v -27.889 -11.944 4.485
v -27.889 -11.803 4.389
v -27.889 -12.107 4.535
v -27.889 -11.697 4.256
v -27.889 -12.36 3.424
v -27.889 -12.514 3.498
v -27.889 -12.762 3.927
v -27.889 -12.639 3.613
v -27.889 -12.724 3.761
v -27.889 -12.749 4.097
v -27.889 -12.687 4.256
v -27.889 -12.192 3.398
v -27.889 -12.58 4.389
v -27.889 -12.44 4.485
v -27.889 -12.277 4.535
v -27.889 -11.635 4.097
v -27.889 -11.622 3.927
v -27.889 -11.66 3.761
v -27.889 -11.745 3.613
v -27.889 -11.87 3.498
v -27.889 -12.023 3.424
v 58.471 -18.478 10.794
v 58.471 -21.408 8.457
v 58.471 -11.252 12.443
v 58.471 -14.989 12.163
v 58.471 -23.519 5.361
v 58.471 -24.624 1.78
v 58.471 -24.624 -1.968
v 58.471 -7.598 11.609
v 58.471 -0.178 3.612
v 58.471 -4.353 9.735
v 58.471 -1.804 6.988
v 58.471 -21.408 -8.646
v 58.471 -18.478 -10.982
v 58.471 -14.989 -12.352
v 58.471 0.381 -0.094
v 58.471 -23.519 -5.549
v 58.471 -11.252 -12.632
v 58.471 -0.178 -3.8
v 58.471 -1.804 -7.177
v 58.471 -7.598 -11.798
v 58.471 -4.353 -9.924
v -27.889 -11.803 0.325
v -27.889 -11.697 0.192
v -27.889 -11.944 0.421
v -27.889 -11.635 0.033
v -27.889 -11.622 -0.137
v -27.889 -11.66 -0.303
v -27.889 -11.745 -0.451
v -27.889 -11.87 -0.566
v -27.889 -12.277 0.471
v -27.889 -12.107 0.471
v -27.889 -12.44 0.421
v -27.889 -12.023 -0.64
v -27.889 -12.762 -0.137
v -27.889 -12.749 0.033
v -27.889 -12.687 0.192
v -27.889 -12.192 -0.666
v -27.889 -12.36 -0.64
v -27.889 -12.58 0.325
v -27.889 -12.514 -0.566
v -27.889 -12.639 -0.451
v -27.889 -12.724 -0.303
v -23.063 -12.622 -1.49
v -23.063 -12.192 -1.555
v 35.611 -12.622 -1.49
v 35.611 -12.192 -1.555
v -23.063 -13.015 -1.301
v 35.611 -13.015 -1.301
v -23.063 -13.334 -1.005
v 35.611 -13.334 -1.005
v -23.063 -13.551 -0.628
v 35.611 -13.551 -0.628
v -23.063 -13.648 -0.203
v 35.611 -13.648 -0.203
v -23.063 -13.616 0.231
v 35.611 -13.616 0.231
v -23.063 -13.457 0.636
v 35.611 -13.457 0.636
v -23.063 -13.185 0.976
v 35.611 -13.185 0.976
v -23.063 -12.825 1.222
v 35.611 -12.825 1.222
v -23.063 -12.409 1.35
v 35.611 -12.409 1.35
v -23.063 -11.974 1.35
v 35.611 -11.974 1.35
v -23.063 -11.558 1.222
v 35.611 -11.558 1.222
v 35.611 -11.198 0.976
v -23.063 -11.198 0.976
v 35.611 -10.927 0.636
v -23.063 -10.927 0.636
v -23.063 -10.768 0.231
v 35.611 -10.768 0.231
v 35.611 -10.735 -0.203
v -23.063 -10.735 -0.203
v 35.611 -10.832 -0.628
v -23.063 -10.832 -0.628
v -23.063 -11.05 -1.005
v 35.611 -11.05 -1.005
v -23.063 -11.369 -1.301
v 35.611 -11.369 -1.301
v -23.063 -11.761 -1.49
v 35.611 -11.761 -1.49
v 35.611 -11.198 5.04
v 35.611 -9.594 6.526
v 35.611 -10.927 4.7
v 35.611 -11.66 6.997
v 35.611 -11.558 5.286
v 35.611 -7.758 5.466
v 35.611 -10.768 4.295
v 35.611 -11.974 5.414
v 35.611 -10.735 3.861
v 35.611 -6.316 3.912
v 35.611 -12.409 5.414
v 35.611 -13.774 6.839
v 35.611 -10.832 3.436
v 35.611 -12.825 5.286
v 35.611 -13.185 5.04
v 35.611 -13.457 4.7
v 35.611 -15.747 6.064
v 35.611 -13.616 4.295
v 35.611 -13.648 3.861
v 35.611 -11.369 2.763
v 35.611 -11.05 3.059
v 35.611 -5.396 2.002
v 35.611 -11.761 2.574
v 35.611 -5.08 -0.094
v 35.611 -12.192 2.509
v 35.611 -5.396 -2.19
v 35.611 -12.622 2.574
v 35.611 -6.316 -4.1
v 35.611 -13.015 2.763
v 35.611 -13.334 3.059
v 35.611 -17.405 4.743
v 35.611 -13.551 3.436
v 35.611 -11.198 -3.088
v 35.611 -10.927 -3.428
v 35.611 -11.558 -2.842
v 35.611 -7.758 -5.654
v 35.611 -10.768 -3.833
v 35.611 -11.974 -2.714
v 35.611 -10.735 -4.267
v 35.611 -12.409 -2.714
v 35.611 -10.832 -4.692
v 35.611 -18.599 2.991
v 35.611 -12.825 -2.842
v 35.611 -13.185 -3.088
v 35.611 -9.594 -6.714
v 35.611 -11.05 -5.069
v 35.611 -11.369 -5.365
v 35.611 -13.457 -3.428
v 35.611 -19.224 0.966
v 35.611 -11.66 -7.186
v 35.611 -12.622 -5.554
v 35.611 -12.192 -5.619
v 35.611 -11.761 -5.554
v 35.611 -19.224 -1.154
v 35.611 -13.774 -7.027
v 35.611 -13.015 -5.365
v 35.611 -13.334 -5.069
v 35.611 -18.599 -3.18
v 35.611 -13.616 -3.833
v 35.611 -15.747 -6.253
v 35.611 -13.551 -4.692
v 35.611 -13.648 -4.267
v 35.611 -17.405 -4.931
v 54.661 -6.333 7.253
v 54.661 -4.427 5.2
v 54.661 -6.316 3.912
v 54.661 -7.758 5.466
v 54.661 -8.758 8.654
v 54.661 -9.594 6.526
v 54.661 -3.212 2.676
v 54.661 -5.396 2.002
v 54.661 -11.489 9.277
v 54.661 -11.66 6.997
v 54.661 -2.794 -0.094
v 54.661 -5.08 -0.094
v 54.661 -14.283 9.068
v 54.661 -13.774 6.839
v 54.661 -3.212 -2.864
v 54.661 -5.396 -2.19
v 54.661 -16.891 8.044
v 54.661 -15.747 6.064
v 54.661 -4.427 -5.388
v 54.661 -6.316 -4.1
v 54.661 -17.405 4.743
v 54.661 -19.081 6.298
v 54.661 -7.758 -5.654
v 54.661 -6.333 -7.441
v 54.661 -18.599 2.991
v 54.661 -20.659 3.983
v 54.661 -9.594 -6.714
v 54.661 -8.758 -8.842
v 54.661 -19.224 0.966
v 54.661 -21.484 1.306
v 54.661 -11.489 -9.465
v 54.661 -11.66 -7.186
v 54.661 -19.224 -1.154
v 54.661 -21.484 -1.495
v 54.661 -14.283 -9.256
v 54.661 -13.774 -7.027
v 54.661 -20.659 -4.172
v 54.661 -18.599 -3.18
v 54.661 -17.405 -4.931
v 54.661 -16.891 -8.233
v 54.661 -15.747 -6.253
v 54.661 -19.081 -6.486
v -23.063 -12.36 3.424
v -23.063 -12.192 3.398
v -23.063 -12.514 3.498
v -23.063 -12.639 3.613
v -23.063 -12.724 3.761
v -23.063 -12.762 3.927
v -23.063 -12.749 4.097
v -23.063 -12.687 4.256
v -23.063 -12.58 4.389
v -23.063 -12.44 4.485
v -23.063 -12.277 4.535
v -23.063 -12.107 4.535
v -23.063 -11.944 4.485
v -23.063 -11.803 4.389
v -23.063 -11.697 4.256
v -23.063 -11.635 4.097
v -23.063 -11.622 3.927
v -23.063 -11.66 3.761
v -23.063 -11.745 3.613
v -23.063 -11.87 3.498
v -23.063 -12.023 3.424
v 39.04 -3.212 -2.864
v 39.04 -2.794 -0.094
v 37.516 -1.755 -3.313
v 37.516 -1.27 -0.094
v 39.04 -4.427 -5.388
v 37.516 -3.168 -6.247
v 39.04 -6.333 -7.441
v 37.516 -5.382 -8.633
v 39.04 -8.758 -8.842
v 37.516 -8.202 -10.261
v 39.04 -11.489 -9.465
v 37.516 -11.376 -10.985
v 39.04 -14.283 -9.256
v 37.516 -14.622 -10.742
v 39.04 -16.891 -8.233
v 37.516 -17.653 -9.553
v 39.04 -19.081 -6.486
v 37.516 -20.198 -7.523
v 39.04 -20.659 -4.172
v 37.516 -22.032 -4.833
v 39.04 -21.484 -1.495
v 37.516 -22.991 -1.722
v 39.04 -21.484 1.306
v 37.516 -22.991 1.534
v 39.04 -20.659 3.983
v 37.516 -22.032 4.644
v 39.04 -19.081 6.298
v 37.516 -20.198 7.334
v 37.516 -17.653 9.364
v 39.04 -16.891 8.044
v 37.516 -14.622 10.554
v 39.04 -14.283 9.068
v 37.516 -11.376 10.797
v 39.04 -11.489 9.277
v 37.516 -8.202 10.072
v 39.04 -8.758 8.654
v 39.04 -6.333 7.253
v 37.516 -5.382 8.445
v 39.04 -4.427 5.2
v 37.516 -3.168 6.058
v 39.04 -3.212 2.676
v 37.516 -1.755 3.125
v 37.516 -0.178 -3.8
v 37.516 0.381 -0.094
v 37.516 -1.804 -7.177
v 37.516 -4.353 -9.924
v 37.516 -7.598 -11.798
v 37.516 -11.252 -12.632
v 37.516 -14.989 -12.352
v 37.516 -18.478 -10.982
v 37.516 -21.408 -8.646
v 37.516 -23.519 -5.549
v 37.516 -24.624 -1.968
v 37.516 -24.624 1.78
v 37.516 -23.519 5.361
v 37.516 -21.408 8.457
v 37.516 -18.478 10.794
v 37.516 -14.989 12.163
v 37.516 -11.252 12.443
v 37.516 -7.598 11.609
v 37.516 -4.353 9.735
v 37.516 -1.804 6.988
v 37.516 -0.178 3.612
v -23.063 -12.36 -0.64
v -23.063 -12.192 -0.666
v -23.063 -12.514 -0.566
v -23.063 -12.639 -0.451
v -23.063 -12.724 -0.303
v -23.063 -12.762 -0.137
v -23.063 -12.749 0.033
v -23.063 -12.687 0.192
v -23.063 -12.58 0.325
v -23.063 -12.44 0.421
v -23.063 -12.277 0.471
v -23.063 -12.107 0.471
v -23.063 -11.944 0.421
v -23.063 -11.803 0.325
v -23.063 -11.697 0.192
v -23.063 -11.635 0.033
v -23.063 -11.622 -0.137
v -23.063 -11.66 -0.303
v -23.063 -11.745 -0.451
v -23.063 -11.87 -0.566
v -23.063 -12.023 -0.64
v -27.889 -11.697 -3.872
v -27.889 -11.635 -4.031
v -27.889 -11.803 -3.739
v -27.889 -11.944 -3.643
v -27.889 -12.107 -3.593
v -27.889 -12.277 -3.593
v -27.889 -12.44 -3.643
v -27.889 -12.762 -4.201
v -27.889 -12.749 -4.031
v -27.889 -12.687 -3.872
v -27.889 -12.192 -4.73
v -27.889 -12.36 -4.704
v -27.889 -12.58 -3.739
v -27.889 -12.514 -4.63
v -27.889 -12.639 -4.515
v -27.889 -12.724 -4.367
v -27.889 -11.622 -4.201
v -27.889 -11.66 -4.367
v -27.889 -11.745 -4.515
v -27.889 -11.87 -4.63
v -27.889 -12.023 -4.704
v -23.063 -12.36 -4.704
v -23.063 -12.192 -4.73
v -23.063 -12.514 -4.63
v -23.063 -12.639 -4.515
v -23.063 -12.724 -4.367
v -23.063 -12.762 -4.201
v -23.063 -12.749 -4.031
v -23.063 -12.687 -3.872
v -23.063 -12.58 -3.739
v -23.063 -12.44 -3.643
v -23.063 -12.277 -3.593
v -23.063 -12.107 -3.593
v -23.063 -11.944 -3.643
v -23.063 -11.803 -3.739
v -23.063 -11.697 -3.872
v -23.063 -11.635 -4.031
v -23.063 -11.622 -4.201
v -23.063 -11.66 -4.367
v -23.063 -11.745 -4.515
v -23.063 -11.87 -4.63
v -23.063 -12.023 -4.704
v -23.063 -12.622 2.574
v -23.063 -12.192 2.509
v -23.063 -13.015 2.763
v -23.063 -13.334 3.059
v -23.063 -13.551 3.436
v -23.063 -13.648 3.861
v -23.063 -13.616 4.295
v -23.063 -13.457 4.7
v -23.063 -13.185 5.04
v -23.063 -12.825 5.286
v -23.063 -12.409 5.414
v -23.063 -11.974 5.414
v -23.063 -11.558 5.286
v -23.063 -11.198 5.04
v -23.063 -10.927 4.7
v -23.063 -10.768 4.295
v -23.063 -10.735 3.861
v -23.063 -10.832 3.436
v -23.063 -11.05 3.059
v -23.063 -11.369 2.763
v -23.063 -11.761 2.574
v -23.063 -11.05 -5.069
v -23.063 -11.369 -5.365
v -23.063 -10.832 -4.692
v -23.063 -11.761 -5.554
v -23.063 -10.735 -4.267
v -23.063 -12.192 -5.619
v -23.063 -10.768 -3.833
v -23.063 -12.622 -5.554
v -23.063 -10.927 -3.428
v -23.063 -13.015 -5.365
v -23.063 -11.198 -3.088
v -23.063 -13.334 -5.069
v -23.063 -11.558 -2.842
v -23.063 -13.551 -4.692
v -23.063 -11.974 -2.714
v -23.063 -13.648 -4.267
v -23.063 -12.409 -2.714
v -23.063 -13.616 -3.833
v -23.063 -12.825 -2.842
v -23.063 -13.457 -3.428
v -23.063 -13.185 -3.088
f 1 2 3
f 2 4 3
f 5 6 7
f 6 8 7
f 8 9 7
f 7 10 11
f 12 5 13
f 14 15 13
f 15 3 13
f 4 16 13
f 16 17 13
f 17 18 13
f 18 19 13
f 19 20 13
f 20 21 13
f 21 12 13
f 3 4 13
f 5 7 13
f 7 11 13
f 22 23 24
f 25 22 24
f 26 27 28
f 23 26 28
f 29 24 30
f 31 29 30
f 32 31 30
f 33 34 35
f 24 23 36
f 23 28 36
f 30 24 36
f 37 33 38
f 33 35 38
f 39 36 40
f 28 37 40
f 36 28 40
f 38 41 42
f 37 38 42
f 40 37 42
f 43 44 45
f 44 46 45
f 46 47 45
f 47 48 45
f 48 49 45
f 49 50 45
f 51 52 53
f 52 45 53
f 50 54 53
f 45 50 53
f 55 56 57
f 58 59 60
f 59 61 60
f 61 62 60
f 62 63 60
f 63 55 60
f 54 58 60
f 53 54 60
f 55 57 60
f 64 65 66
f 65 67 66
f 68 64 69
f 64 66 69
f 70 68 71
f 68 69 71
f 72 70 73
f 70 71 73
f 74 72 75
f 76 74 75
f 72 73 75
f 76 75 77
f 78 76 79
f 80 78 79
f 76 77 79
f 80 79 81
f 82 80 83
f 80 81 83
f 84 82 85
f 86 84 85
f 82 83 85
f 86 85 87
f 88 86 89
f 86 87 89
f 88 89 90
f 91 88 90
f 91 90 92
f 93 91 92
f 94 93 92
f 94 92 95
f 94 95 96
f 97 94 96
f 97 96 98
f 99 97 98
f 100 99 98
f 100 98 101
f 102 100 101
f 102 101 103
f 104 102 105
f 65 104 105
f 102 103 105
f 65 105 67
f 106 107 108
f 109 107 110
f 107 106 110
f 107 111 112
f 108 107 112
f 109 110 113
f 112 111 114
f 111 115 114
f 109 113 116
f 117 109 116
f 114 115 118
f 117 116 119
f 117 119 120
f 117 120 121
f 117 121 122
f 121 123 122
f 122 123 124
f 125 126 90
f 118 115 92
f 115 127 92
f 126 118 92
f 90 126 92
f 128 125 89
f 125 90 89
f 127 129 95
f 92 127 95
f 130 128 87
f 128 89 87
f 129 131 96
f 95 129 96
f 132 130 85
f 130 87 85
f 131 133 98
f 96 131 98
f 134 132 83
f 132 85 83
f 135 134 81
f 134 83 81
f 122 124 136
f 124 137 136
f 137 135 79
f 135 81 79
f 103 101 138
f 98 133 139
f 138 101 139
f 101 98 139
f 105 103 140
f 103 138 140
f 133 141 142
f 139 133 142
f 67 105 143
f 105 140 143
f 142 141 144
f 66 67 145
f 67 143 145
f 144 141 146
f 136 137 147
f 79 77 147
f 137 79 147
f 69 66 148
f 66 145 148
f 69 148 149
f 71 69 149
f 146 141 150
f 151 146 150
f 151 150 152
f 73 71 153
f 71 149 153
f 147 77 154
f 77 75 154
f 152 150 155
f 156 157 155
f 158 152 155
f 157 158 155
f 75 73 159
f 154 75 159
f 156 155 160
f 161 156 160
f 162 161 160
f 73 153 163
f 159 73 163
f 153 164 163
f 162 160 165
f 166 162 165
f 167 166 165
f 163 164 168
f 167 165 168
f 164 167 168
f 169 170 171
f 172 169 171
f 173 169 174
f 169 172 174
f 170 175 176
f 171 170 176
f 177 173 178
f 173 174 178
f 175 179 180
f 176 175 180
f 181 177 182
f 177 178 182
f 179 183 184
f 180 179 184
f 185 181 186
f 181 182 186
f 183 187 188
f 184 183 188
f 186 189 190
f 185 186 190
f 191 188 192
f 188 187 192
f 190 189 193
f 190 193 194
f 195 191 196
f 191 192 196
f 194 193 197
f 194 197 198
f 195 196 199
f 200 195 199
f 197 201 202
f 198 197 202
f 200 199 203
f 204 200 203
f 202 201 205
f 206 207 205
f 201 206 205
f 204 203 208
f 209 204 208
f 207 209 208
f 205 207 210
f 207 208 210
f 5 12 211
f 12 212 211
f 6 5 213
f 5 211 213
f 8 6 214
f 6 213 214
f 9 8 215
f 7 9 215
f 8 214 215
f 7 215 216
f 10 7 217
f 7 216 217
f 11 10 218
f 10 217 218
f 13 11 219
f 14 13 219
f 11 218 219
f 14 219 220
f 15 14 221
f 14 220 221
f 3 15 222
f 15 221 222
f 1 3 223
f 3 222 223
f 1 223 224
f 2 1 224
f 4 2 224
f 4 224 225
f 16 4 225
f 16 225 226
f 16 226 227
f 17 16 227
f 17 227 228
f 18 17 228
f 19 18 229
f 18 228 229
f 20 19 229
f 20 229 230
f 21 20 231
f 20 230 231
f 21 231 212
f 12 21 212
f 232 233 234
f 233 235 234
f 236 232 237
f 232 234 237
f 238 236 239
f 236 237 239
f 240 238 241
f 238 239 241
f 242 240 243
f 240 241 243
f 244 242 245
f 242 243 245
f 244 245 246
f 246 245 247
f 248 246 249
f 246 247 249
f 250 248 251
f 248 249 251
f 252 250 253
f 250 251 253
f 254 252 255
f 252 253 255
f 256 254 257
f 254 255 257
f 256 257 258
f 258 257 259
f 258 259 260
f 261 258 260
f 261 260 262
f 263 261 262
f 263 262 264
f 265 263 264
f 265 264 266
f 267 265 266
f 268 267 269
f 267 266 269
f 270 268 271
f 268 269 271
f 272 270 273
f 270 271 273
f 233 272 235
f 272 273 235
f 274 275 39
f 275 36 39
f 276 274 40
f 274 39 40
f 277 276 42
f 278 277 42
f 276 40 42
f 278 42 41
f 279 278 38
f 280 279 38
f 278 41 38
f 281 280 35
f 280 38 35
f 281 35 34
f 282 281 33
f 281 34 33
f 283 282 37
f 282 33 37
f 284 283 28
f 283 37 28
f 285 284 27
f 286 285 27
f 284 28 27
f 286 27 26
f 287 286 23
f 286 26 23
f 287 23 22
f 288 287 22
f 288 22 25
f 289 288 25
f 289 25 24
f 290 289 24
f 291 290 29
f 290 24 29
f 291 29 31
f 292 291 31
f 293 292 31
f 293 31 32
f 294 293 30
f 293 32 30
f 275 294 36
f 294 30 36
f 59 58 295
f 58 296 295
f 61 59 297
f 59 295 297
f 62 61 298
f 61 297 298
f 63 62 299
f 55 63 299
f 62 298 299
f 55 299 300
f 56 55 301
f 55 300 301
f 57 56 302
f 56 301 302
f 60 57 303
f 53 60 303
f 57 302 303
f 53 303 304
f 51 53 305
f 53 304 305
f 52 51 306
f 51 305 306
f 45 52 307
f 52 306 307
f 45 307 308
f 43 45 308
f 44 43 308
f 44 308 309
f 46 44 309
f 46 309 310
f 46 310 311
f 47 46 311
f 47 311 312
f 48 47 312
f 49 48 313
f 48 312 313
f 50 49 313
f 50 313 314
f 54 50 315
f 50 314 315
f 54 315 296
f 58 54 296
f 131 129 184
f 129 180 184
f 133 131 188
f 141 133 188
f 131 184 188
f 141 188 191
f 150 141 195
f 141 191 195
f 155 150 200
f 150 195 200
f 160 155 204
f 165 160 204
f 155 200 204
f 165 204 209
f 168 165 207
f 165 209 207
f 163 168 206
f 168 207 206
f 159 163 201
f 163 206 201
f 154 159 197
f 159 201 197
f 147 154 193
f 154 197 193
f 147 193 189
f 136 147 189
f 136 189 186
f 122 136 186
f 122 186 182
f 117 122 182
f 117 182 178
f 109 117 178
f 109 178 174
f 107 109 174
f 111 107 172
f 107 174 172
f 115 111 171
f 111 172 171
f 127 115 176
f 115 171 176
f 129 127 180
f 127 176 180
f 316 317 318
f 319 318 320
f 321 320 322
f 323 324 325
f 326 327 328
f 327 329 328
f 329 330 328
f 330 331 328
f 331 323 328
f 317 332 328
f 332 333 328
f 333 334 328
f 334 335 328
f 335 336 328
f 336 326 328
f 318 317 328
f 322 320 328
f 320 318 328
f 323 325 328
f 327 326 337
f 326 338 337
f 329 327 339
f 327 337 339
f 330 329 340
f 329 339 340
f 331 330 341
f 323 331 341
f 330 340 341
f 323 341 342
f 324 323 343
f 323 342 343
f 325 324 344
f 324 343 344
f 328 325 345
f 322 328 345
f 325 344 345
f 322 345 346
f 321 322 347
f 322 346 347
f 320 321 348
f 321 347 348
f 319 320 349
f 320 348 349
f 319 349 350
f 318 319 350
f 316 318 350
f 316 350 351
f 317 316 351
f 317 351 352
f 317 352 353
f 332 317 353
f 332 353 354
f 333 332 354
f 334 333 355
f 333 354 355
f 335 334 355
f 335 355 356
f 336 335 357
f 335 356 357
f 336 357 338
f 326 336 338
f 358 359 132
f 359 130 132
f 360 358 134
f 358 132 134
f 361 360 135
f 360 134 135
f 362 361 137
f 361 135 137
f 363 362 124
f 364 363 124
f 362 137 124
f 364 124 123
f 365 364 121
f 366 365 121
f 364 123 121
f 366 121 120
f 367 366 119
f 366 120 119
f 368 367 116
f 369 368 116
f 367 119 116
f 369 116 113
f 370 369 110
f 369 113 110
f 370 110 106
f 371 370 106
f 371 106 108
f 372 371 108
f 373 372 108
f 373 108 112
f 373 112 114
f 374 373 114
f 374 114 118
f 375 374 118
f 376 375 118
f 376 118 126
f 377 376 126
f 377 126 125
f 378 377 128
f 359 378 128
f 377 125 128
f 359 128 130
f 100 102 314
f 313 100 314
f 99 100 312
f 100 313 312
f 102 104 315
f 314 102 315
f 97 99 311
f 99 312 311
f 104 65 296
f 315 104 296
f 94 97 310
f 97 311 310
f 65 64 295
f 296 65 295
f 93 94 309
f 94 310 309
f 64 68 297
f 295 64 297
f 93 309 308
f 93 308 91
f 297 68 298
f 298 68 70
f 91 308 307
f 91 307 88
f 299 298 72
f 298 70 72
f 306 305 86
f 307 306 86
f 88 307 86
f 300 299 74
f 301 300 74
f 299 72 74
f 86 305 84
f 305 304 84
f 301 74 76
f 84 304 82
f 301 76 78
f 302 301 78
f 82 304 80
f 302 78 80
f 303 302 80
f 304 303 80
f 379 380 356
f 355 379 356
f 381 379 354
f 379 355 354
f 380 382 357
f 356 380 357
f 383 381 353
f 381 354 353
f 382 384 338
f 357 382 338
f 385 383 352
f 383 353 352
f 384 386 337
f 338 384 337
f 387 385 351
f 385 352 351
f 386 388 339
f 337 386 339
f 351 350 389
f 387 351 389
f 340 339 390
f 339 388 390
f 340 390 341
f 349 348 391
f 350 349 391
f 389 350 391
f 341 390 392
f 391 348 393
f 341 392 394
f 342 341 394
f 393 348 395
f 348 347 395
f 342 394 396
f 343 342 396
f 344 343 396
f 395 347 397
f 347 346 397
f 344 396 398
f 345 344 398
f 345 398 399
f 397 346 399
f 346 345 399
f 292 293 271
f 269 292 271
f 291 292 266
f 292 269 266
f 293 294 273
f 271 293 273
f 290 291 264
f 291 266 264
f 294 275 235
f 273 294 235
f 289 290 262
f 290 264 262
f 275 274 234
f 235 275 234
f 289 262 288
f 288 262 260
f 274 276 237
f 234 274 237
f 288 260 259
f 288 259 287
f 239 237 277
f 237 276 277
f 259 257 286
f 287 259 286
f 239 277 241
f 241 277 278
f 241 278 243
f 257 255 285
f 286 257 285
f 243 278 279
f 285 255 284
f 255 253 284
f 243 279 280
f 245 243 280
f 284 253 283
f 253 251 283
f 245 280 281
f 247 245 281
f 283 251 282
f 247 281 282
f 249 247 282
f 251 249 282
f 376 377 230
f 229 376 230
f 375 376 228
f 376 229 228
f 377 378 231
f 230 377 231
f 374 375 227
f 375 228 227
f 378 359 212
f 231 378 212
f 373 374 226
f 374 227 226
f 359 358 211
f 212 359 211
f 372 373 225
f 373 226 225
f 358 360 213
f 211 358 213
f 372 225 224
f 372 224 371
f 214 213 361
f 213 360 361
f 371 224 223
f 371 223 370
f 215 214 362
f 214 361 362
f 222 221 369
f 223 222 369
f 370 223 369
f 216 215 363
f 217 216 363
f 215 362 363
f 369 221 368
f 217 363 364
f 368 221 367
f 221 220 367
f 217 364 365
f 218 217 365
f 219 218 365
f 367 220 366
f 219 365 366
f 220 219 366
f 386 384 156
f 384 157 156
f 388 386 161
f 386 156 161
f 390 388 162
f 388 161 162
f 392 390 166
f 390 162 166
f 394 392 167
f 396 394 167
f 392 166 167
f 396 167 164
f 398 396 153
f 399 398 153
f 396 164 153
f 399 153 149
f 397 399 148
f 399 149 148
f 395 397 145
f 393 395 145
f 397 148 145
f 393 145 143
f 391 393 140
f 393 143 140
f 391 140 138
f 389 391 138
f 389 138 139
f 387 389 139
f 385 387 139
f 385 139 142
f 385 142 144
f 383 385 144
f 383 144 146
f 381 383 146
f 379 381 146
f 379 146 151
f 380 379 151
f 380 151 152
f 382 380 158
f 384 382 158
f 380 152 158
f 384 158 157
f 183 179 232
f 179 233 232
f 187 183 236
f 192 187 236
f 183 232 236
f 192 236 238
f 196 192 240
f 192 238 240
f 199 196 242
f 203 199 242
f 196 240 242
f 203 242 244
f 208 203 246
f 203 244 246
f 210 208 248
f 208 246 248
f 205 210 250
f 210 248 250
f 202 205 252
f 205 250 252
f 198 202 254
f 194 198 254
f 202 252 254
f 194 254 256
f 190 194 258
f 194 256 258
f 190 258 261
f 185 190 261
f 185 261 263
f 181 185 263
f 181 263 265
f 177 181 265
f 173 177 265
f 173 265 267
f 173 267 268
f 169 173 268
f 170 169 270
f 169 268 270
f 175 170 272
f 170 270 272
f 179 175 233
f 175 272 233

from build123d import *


with BuildPart() as part:
    # Sketch1 → Revolve1 (revolve)
    with BuildSketch(Plane.XY.offset(-0.0942096)):
        Polygon((35.6108, -12.191773113), (35.6108, -5.080397281), (54.6608, -5.080396955), (54.6608, -2.794255147), (39.0398, -2.794245161), (37.5158, -1.270188911), (37.5158, 0.380874088), (58.4708, 0.380865578), (58.4708, -12.191773113), align=None)
    revolve(axis=Axis((58.4708, -12.191773113, -0.0942096), (-1, 0, 0)))

    # Sketch2 → Revolve2 (revolve)
    with BuildSketch(Plane(origin=(0, -12.191772951, 0), x_dir=(1, 0, 0), z_dir=(0, 1, 0))):
        Polygon((-27.8892, -3.9697904), (-27.8892, -3.3982904), (-23.0632, -3.3982904), (-23.0632, -2.509290489), (35.6108, -2.509290489), (35.6108, -3.9697904), align=None)
    revolve(axis=Axis((35.6108, -12.191772951, 3.9697904), (-1, 0, 0)))

    # Sketch3 → Revolve3 (revolve)
    with BuildSketch(Plane(origin=(0, -12.191772951, 0), x_dir=(1, 0, 0), z_dir=(0, 1, 0))):
        Polygon((-27.8892, 4.1582096), (-27.8892, 4.7297096), (-23.0632, 4.7297096), (-23.0632, 5.618709512), (35.6108, 5.618709512), (35.6108, 4.1582096), align=None)
    revolve(axis=Axis((35.6108, -12.191772951, -4.1582096), (-1, 0, 0)))

    # Sketch4 → Revolve4 (revolve)
    with BuildSketch(Plane(origin=(0, -12.191772951, 0), x_dir=(1, 0, 0), z_dir=(0, 1, 0))):
        Polygon((-27.8892, 0.0942096), (-27.8892, 0.6657096), (-23.0632, 0.6657096), (-23.0632, 1.554709511), (35.6108, 1.554709511), (35.6108, 0.0942096), align=None)
    revolve(axis=Axis((35.6108, -12.191772951, -0.0942096), (-1, 0, 0)))


solid = part.part
